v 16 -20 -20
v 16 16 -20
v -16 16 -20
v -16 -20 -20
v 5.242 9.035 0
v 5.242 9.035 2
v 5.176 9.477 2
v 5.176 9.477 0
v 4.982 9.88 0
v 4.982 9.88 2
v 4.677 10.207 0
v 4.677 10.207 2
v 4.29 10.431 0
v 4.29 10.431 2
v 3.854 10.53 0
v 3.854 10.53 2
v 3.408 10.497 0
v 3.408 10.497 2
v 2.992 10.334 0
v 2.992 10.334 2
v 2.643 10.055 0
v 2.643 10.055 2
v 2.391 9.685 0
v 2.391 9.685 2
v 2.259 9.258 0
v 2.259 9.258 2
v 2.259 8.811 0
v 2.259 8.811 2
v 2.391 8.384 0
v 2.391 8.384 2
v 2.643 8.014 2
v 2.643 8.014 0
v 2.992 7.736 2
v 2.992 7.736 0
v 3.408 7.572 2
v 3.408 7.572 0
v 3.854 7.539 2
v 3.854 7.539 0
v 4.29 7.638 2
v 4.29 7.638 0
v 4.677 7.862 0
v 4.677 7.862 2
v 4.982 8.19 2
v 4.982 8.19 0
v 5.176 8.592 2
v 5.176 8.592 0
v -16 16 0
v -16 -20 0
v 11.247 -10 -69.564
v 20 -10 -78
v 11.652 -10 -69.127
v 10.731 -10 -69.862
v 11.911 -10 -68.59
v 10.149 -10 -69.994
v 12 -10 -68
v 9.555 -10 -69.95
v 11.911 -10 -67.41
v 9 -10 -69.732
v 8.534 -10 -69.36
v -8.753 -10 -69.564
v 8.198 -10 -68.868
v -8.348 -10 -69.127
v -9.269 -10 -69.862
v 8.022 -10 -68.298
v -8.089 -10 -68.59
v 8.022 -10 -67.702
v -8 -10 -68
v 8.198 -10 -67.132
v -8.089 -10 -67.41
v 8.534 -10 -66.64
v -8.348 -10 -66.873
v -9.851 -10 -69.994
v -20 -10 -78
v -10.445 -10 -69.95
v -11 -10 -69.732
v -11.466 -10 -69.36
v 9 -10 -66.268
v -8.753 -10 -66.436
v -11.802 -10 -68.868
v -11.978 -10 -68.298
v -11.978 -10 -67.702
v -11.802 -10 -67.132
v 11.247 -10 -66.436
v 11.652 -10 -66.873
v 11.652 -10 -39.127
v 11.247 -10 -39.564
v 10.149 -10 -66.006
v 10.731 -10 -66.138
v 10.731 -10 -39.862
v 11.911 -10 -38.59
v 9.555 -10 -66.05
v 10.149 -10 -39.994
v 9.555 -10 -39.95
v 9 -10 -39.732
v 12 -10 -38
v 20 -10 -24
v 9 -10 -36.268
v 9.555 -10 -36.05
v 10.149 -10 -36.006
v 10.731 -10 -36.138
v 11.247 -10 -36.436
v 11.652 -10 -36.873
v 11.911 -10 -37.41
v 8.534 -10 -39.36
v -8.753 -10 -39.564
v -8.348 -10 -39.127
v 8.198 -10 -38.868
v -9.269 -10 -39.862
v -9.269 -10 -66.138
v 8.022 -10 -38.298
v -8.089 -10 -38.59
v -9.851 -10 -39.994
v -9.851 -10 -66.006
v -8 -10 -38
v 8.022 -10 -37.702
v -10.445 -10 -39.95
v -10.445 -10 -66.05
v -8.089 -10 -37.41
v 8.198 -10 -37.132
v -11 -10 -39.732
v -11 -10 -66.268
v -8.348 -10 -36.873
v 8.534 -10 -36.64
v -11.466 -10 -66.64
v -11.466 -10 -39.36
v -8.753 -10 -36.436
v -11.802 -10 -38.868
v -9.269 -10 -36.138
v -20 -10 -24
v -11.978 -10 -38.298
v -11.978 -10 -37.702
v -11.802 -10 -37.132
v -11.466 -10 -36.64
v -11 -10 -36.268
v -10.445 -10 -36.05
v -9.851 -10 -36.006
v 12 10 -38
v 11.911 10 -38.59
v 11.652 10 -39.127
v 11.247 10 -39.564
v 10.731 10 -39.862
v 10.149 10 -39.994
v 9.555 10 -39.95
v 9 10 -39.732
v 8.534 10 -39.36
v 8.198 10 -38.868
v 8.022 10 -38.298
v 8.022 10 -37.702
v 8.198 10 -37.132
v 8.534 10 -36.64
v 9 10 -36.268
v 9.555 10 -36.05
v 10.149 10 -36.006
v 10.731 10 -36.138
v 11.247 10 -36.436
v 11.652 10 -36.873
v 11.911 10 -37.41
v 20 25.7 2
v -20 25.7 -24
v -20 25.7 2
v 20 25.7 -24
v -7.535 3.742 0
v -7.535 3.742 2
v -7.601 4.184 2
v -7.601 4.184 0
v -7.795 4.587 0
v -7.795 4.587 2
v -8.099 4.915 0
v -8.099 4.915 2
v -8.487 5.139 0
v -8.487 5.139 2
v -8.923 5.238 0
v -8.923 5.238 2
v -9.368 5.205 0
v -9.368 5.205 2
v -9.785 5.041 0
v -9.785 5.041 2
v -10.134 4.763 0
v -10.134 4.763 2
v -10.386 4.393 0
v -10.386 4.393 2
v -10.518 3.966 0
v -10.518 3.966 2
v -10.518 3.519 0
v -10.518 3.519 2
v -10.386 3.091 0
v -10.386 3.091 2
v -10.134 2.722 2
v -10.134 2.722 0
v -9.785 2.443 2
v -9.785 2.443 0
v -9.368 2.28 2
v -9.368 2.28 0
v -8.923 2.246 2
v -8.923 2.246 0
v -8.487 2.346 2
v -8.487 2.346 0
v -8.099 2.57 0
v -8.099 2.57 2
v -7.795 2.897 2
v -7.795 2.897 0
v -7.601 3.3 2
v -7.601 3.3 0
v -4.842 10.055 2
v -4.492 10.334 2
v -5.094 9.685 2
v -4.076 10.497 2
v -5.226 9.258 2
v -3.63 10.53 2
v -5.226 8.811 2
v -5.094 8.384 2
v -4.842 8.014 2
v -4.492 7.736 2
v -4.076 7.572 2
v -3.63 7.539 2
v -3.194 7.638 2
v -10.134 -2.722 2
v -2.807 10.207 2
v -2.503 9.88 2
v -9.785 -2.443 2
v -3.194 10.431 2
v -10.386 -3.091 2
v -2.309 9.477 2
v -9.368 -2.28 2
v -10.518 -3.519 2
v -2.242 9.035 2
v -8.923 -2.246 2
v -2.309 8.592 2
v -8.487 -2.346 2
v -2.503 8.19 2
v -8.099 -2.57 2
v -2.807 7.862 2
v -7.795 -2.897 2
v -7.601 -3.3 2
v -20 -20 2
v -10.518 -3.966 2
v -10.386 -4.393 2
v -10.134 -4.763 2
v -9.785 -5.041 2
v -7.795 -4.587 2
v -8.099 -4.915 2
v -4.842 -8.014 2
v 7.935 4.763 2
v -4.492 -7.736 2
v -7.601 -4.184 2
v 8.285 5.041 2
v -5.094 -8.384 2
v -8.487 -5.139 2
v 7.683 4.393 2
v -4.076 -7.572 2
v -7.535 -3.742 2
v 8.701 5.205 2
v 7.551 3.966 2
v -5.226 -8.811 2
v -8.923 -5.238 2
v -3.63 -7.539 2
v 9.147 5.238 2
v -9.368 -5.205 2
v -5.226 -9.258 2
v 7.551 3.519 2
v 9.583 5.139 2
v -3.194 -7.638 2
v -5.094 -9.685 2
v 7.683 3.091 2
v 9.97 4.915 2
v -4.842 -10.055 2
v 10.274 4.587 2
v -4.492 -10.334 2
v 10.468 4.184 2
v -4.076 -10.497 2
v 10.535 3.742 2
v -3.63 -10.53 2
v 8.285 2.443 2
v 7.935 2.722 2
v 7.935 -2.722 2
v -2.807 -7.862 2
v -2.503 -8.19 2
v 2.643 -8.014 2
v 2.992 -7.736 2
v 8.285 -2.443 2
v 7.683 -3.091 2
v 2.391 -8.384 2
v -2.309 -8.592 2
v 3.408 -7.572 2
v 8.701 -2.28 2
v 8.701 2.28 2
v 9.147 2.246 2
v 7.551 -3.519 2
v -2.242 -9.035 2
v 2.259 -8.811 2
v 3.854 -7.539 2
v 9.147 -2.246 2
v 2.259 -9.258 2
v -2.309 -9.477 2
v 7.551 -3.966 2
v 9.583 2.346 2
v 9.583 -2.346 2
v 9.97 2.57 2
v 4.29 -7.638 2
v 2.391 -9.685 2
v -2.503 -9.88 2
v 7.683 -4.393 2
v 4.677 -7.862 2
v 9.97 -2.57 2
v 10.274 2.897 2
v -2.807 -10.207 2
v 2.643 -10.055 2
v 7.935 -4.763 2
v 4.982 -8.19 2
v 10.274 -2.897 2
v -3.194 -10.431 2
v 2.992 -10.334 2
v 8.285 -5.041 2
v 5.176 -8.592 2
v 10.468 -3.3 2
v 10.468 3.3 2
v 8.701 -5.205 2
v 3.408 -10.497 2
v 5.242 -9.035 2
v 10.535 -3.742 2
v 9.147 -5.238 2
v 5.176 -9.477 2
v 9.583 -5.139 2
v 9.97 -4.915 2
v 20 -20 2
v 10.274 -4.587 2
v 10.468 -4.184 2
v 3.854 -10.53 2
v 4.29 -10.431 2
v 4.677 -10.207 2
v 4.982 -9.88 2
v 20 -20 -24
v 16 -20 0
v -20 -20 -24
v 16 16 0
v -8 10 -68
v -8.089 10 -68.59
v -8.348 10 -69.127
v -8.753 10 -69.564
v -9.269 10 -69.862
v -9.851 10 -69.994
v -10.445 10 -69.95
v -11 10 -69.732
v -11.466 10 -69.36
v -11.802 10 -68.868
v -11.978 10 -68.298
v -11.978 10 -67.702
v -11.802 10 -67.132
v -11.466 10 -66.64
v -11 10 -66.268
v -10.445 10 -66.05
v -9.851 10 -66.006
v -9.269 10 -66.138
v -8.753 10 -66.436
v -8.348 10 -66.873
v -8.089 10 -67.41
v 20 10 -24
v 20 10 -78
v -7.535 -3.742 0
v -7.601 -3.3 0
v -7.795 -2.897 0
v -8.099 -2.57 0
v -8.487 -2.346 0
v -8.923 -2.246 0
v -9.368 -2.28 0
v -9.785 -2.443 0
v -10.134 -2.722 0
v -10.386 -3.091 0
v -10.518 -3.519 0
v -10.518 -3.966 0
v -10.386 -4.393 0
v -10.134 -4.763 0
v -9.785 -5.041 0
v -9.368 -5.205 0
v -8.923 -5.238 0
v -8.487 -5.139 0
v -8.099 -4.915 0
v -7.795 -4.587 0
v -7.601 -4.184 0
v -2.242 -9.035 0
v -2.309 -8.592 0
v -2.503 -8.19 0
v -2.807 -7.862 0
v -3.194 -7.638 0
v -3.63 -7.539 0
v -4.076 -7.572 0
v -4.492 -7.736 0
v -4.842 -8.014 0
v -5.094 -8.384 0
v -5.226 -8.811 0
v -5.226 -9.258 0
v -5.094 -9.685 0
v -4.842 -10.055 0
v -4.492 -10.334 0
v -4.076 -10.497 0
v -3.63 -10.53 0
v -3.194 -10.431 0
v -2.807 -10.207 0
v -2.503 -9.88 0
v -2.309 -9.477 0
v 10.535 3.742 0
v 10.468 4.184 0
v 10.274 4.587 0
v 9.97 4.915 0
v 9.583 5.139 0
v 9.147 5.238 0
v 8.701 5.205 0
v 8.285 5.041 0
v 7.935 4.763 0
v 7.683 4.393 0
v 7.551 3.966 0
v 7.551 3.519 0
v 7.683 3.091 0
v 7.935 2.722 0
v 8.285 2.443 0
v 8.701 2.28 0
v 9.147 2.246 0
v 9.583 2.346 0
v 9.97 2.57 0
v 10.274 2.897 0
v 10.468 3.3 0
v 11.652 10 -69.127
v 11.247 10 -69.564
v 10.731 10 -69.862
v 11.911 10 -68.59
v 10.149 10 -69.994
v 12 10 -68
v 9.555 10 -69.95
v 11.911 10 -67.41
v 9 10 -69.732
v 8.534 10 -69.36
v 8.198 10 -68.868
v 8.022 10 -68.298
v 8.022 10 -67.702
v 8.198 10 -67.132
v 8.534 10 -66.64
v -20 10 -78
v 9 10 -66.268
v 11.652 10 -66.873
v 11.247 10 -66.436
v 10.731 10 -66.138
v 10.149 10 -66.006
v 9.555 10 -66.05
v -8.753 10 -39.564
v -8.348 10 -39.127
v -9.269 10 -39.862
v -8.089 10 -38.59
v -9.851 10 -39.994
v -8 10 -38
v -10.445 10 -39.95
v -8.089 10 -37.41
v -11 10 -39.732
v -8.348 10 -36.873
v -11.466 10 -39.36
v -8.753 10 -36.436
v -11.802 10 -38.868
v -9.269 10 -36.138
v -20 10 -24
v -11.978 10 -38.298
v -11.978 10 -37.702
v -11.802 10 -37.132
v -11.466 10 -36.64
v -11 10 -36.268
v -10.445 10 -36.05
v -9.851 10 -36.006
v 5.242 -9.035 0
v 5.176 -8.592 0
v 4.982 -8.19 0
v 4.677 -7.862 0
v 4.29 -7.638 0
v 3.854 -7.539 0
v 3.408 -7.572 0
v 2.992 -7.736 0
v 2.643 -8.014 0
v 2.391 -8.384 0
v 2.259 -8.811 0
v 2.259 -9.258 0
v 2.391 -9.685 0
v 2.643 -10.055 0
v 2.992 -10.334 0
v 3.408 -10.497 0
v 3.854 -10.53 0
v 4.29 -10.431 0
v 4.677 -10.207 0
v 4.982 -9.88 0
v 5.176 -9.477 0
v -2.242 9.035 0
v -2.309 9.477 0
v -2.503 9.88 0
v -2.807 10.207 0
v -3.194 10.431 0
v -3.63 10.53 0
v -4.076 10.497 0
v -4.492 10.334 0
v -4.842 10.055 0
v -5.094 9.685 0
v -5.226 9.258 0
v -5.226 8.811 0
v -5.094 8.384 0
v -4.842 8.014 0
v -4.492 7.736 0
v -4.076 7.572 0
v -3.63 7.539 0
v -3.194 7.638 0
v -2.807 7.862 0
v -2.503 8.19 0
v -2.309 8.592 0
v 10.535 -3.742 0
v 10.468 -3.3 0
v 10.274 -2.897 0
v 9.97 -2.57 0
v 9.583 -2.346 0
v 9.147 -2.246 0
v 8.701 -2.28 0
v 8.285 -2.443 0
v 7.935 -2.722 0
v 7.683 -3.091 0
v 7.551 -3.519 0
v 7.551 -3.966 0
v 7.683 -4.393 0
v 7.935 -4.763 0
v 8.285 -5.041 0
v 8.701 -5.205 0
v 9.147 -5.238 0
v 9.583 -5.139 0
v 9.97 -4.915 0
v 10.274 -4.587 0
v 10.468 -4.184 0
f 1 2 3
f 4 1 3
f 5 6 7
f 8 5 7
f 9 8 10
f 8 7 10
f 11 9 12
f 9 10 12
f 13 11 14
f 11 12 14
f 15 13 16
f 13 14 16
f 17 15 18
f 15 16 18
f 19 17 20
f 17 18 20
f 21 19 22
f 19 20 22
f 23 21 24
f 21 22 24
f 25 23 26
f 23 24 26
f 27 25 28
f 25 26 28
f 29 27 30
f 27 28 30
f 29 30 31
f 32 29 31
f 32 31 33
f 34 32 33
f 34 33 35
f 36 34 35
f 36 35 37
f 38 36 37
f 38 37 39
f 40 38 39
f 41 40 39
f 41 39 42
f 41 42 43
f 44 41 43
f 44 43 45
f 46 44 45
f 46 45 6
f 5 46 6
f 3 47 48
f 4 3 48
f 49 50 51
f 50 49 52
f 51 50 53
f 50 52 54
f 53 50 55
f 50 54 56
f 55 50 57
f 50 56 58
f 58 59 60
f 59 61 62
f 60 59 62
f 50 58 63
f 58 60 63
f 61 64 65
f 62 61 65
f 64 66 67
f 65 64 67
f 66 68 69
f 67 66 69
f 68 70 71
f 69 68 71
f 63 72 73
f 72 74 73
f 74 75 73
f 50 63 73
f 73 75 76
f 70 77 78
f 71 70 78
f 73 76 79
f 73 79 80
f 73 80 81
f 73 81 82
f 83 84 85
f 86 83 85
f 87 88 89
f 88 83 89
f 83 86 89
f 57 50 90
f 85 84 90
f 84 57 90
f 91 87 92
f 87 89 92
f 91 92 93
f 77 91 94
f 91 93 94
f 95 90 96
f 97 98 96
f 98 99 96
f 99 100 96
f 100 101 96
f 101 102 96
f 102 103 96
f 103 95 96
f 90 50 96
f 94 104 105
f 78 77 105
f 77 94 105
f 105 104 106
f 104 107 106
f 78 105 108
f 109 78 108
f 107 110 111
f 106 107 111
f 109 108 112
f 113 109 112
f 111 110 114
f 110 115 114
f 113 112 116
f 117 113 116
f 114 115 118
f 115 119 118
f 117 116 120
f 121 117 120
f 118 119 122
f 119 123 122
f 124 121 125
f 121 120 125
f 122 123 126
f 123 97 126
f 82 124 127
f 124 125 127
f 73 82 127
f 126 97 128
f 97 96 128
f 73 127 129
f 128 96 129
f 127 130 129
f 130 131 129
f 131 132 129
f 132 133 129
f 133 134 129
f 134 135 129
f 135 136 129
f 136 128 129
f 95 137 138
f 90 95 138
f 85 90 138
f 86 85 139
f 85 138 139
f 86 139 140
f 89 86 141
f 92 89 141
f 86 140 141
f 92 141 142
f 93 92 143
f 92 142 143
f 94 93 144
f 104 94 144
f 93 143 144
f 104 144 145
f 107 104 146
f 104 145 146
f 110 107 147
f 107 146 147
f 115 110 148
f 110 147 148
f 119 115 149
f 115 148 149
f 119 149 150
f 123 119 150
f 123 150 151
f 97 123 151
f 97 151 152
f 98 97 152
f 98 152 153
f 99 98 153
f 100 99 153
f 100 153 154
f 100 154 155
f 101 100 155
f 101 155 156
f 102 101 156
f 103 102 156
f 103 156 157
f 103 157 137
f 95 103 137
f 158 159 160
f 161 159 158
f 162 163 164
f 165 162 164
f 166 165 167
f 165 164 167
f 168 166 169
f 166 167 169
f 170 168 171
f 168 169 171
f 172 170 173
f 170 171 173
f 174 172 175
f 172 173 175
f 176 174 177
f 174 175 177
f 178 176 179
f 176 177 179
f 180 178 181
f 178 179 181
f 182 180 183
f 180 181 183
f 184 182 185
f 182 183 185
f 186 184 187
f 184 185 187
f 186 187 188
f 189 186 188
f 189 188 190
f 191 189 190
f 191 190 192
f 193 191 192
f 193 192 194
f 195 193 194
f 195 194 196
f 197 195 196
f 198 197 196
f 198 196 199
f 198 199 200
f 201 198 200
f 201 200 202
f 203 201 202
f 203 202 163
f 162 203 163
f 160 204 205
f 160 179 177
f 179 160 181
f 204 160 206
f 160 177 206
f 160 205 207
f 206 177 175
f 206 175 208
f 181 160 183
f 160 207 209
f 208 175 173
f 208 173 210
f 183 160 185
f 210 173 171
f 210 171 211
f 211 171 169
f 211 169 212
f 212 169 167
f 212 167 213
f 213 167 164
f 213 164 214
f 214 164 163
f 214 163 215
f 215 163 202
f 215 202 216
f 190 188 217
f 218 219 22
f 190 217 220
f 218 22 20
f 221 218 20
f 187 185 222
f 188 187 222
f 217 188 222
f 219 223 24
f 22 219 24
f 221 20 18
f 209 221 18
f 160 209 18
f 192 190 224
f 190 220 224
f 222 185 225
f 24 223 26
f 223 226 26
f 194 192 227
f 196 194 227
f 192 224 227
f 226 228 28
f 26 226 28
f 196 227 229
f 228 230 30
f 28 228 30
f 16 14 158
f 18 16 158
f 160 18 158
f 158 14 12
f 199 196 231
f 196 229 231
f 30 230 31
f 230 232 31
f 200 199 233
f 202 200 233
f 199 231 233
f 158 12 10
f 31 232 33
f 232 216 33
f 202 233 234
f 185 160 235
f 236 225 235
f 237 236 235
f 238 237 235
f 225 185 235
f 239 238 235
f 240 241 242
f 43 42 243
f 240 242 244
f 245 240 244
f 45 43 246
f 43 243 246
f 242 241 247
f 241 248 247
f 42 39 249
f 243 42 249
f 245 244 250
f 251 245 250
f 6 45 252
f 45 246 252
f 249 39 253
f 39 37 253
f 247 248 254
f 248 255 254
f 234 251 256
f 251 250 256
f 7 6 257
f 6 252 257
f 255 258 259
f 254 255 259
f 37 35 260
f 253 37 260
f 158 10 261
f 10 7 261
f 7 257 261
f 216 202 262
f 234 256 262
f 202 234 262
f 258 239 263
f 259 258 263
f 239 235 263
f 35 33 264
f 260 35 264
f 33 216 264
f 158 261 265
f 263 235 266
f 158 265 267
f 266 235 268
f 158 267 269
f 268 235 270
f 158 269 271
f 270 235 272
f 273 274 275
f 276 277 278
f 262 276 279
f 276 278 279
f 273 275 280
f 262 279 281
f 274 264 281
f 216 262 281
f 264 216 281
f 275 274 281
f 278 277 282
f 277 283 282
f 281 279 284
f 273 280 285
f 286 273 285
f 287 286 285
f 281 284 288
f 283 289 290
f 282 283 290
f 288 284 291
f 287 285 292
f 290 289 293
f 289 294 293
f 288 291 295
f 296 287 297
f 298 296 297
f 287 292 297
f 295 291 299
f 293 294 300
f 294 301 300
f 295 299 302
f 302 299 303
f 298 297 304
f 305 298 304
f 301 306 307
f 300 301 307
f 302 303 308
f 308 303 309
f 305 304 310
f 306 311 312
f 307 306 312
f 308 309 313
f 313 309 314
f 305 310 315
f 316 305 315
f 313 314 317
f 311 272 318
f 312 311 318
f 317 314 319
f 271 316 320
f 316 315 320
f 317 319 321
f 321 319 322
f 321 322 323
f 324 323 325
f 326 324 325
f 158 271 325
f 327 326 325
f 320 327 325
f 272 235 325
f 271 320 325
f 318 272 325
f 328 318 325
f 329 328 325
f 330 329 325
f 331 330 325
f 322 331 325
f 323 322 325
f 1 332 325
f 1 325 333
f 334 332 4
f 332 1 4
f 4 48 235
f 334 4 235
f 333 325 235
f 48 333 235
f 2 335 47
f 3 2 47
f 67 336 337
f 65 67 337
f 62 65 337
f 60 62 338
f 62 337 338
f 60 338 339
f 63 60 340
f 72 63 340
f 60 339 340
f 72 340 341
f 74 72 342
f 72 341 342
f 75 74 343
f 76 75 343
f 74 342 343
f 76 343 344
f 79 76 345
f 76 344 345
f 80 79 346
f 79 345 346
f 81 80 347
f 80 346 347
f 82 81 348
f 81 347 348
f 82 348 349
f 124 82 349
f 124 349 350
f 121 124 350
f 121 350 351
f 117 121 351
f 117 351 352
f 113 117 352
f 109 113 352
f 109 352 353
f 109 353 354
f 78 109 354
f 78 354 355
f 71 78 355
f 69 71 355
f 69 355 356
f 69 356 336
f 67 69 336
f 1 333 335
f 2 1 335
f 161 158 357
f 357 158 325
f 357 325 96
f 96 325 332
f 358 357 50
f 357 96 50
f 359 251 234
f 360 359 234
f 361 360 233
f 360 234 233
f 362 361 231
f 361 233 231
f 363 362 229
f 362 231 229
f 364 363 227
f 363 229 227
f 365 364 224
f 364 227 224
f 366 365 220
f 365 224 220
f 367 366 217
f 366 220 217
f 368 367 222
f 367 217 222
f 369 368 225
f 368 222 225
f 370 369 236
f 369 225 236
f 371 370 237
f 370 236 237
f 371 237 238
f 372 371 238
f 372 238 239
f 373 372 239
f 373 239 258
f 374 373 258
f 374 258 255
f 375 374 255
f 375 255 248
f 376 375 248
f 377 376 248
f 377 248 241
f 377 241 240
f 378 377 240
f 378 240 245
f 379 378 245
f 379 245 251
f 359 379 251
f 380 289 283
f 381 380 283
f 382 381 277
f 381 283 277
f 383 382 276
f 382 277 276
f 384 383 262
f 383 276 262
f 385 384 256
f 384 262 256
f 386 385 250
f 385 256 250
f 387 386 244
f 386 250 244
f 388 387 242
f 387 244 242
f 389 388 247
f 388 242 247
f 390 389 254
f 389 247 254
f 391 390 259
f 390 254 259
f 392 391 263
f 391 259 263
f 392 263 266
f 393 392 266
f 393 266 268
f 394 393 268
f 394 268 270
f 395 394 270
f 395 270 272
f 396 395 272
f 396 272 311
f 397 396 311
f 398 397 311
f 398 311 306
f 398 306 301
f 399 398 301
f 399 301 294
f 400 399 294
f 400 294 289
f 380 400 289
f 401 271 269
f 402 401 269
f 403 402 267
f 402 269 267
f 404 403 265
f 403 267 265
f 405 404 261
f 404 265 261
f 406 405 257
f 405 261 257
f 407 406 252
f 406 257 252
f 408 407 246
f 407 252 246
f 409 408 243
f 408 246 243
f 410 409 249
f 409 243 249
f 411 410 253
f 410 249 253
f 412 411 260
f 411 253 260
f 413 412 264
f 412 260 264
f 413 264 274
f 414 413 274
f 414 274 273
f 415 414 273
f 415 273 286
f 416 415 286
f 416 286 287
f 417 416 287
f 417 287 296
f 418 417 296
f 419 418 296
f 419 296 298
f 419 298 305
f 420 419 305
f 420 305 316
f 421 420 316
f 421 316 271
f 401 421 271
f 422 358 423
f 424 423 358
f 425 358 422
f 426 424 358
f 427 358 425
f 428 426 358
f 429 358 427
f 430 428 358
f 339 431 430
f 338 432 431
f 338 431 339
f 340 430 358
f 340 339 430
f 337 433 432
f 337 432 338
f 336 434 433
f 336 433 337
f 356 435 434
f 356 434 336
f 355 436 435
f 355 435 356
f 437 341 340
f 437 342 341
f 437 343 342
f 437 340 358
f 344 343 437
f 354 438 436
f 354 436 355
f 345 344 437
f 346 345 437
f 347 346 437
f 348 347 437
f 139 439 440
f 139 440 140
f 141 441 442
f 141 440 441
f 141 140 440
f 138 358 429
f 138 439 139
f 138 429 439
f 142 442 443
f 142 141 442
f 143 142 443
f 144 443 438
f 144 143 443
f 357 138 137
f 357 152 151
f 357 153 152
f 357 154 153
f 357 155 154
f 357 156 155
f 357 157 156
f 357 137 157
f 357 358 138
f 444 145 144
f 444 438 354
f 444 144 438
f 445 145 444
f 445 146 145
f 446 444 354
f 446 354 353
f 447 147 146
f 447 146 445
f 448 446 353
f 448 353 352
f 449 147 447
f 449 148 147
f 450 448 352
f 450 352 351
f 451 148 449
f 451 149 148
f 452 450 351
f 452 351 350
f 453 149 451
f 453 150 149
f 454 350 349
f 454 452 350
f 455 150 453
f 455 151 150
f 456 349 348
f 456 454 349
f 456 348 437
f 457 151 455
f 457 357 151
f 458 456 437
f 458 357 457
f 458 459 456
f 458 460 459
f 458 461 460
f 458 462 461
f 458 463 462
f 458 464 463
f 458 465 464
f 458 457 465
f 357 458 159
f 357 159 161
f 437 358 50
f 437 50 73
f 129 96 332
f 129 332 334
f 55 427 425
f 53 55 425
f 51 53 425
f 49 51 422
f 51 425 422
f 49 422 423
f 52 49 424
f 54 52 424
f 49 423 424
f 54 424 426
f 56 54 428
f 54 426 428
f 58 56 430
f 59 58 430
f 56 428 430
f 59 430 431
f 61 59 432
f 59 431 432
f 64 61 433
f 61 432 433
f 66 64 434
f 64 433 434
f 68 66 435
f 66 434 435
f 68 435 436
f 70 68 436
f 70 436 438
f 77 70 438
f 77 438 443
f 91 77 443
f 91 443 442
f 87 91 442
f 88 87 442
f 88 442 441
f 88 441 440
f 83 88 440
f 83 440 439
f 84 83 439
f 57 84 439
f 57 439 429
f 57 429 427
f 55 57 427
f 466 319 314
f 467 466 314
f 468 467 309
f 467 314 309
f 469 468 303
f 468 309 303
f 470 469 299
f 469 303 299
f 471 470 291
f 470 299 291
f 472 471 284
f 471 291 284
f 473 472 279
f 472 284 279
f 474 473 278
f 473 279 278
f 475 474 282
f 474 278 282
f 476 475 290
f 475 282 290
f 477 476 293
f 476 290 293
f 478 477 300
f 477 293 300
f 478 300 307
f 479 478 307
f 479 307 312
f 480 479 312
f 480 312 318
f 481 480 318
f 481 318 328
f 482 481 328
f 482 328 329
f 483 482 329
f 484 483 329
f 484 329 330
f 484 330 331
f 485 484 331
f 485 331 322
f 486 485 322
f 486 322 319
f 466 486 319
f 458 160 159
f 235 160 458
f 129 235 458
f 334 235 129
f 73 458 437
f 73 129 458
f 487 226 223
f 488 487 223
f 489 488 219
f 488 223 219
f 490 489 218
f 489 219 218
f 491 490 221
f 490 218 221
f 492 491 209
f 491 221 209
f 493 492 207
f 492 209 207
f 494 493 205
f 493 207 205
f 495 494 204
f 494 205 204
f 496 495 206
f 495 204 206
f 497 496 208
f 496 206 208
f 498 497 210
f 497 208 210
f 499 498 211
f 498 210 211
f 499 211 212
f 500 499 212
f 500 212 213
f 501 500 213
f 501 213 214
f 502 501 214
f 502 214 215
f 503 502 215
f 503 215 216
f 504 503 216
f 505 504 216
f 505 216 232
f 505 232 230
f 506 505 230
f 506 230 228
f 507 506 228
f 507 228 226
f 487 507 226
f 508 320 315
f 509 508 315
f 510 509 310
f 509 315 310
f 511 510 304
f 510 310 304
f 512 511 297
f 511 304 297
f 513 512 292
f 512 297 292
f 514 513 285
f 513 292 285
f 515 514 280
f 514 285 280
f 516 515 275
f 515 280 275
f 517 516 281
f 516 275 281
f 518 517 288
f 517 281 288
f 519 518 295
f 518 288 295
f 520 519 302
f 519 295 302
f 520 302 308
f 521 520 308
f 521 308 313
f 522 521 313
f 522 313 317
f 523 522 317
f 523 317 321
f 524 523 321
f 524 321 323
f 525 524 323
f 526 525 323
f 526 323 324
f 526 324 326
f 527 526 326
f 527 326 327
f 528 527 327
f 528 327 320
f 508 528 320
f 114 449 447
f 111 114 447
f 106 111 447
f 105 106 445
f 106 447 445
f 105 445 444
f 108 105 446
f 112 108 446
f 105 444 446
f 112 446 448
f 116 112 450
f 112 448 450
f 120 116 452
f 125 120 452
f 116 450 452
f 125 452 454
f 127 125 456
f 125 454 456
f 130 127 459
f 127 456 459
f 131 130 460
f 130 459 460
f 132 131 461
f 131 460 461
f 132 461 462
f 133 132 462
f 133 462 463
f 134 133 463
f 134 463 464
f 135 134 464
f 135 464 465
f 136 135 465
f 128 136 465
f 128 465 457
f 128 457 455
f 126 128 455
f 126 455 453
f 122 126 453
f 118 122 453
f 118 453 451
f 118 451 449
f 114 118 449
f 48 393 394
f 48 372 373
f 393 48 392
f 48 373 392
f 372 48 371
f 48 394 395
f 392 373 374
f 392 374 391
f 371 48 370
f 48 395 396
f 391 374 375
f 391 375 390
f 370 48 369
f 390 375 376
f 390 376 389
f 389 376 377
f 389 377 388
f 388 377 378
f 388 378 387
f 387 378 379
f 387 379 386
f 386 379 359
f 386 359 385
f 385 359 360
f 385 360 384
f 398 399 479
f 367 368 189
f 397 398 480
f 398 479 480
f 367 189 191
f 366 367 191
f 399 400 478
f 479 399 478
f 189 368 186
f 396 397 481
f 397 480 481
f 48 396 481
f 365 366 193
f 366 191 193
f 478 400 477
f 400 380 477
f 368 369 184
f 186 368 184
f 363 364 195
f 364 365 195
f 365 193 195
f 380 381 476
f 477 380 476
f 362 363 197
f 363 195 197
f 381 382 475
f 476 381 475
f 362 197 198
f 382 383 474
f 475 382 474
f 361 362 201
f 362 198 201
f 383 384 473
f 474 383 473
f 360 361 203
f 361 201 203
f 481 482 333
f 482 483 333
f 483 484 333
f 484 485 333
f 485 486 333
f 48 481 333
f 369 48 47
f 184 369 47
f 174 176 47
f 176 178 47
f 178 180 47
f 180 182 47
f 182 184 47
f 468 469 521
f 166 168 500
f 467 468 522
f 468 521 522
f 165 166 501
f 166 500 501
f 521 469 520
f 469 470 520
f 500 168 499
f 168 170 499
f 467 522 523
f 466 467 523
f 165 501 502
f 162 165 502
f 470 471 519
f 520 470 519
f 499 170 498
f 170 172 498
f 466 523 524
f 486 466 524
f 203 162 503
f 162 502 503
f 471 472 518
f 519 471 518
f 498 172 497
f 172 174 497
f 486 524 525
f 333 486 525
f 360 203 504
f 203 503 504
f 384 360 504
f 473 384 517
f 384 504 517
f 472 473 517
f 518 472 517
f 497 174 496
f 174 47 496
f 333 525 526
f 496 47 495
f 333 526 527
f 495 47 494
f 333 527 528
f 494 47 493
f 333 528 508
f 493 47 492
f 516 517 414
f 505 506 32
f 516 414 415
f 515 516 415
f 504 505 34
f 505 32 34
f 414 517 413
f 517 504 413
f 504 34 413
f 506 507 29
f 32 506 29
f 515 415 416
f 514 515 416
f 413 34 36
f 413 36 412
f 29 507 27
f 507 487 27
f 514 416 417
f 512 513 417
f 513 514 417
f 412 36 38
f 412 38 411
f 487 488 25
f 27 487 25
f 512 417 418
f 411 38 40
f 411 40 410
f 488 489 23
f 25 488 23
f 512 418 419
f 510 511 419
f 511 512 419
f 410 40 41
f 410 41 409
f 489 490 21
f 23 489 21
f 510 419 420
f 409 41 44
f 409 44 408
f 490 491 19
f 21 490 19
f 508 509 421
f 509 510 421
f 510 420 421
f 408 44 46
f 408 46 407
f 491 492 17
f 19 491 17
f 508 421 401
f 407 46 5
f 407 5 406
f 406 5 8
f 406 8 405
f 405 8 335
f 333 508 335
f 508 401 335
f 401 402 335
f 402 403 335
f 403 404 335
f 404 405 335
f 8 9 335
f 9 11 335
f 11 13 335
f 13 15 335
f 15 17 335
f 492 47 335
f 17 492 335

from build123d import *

# Parameters (mm, degrees)
CROQUIS1_W              = 40
CROQUIS1_H              = 40
SALIENTE_EXTRUIR1_DEPTH = 4
CROQUIS2_R              = 1.5
CORTAR_EXTRUIR1_DEPTH   = 4
SALIENTE_EXTRUIR2_DEPTH = 20
CROQUIS4_W              = 40
CROQUIS4_H              = 40
SALIENTE_EXTRUIR3_DEPTH = 4
CROQUIS6_W              = 40
CROQUIS6_H              = 40
CORTAR_EXTRUIR3_DEPTH   = 2
CROQUIS7_W              = 40
CROQUIS7_H              = 20
SALIENTE_EXTRUIR4_DEPTH = 80
CROQUIS8_R              = 2
CORTAR_EXTRUIR4_DEPTH   = 31
CROQUIS9_R              = 2
CORTAR_EXTRUIR5_DEPTH   = 31
CROQUIS11_W             = 40
CROQUIS11_H             = 20
CORTAR_EXTRUIR6_DEPTH   = 26
CROQUIS13_W             = 40
CROQUIS13_H             = 26
SALIENTE_EXTRUIR5_DEPTH = 5.7


with BuildPart() as part:
    # Croquis1 → Saliente-Extruir1 (new body)
    with BuildSketch(Plane.XY):
        Rectangle(CROQUIS1_W, CROQUIS1_H)
    extrude(amount=SALIENTE_EXTRUIR1_DEPTH)

    # Croquis2 → Cortar-Extruir1 (cut)
    with BuildSketch(Plane.XY.offset(4)):
        with Locations((-9.034617948, -3.742261285)):
            Circle(CROQUIS2_R)
        with Locations((-9.034617948, 3.742261285)):
            Circle(CROQUIS2_R)
        with Locations((-3.742261285, 9.034617948)):
            Circle(CROQUIS2_R)
        with Locations((3.742261285, 9.034617948)):
            Circle(CROQUIS2_R)
        with Locations((9.034617948, 3.742261285)):
            Circle(CROQUIS2_R)
        with Locations((9.034617948, -3.742261285)):
            Circle(CROQUIS2_R)
        with Locations((3.742261285, -9.034617948)):
            Circle(CROQUIS2_R)
        with Locations((-3.742261285, -9.034617948)):
            Circle(CROQUIS2_R)
    extrude(amount=-CORTAR_EXTRUIR1_DEPTH, mode=Mode.SUBTRACT)

    # Croquis3 → Saliente-Extruir2 (add)
    with BuildSketch(Plane(origin=(0, 0, 0), x_dir=(-1, 0, 0), z_dir=(0, 0, -1))):
        Polygon((-16, -20), (-16, -16), (-16, 16), (16, 16), (16, -16), (16, -20), (20, -20), (20, 20), (-20, 20), (-20, -20), align=None)
    extrude(amount=SALIENTE_EXTRUIR2_DEPTH)

    # Croquis4 → Saliente-Extruir3 (add)
    with BuildSketch(Plane(origin=(0, 0, -20), x_dir=(-1, 0, 0), z_dir=(0, 0, -1))):
        Rectangle(CROQUIS4_W, CROQUIS4_H)
    extrude(amount=SALIENTE_EXTRUIR3_DEPTH)

    # Croquis6 → Cortar-Extruir3 (cut)
    with BuildSketch(Plane.XY.offset(4)):
        Rectangle(CROQUIS6_W, CROQUIS6_H)
    extrude(amount=-CORTAR_EXTRUIR3_DEPTH, mode=Mode.SUBTRACT)

    # Croquis7 → Saliente-Extruir4 (add)
    with BuildSketch(Plane(origin=(0, 0, -24), x_dir=(-1, 0, 0), z_dir=(0, 0, -1))):
        Rectangle(CROQUIS7_W, CROQUIS7_H)
    extrude(amount=SALIENTE_EXTRUIR4_DEPTH)

    # Croquis8 → Cortar-Extruir4 (cut, through all)
    with BuildSketch(Plane(origin=(0, 10, 0), x_dir=(1, 0, 0), z_dir=(0, 1, 0))):
        with Locations((-10, 38)):
            Circle(CROQUIS8_R)
        with Locations((10, 38)):
            Circle(CROQUIS8_R)
    extrude(amount=-CORTAR_EXTRUIR4_DEPTH, mode=Mode.SUBTRACT)

    # Croquis9 → Cortar-Extruir5 (cut, through all)
    with BuildSketch(Plane(origin=(0, 10, 0), x_dir=(1, 0, 0), z_dir=(0, 1, 0))):
        with Locations((10, 68)):
            Circle(CROQUIS9_R)
        with Locations((-10, 68)):
            Circle(CROQUIS9_R)
    extrude(amount=-CORTAR_EXTRUIR5_DEPTH, mode=Mode.SUBTRACT)

    # Croquis11 → Cortar-Extruir6 (cut)
    with BuildSketch(Plane(origin=(0, 0, -104), x_dir=(-1, 0, 0), z_dir=(0, 0, -1))):
        Rectangle(CROQUIS11_W, CROQUIS11_H)
    extrude(amount=-CORTAR_EXTRUIR6_DEPTH, mode=Mode.SUBTRACT)

    # Croquis13 → Saliente-Extruir5 (add)
    with BuildSketch(Plane(origin=(0, 20, 0), x_dir=(1, 0, 0), z_dir=(0, 1, 0))):
        with Locations((0, 11)):
            Rectangle(CROQUIS13_W, CROQUIS13_H)
    extrude(amount=SALIENTE_EXTRUIR5_DEPTH)


solid = part.part
